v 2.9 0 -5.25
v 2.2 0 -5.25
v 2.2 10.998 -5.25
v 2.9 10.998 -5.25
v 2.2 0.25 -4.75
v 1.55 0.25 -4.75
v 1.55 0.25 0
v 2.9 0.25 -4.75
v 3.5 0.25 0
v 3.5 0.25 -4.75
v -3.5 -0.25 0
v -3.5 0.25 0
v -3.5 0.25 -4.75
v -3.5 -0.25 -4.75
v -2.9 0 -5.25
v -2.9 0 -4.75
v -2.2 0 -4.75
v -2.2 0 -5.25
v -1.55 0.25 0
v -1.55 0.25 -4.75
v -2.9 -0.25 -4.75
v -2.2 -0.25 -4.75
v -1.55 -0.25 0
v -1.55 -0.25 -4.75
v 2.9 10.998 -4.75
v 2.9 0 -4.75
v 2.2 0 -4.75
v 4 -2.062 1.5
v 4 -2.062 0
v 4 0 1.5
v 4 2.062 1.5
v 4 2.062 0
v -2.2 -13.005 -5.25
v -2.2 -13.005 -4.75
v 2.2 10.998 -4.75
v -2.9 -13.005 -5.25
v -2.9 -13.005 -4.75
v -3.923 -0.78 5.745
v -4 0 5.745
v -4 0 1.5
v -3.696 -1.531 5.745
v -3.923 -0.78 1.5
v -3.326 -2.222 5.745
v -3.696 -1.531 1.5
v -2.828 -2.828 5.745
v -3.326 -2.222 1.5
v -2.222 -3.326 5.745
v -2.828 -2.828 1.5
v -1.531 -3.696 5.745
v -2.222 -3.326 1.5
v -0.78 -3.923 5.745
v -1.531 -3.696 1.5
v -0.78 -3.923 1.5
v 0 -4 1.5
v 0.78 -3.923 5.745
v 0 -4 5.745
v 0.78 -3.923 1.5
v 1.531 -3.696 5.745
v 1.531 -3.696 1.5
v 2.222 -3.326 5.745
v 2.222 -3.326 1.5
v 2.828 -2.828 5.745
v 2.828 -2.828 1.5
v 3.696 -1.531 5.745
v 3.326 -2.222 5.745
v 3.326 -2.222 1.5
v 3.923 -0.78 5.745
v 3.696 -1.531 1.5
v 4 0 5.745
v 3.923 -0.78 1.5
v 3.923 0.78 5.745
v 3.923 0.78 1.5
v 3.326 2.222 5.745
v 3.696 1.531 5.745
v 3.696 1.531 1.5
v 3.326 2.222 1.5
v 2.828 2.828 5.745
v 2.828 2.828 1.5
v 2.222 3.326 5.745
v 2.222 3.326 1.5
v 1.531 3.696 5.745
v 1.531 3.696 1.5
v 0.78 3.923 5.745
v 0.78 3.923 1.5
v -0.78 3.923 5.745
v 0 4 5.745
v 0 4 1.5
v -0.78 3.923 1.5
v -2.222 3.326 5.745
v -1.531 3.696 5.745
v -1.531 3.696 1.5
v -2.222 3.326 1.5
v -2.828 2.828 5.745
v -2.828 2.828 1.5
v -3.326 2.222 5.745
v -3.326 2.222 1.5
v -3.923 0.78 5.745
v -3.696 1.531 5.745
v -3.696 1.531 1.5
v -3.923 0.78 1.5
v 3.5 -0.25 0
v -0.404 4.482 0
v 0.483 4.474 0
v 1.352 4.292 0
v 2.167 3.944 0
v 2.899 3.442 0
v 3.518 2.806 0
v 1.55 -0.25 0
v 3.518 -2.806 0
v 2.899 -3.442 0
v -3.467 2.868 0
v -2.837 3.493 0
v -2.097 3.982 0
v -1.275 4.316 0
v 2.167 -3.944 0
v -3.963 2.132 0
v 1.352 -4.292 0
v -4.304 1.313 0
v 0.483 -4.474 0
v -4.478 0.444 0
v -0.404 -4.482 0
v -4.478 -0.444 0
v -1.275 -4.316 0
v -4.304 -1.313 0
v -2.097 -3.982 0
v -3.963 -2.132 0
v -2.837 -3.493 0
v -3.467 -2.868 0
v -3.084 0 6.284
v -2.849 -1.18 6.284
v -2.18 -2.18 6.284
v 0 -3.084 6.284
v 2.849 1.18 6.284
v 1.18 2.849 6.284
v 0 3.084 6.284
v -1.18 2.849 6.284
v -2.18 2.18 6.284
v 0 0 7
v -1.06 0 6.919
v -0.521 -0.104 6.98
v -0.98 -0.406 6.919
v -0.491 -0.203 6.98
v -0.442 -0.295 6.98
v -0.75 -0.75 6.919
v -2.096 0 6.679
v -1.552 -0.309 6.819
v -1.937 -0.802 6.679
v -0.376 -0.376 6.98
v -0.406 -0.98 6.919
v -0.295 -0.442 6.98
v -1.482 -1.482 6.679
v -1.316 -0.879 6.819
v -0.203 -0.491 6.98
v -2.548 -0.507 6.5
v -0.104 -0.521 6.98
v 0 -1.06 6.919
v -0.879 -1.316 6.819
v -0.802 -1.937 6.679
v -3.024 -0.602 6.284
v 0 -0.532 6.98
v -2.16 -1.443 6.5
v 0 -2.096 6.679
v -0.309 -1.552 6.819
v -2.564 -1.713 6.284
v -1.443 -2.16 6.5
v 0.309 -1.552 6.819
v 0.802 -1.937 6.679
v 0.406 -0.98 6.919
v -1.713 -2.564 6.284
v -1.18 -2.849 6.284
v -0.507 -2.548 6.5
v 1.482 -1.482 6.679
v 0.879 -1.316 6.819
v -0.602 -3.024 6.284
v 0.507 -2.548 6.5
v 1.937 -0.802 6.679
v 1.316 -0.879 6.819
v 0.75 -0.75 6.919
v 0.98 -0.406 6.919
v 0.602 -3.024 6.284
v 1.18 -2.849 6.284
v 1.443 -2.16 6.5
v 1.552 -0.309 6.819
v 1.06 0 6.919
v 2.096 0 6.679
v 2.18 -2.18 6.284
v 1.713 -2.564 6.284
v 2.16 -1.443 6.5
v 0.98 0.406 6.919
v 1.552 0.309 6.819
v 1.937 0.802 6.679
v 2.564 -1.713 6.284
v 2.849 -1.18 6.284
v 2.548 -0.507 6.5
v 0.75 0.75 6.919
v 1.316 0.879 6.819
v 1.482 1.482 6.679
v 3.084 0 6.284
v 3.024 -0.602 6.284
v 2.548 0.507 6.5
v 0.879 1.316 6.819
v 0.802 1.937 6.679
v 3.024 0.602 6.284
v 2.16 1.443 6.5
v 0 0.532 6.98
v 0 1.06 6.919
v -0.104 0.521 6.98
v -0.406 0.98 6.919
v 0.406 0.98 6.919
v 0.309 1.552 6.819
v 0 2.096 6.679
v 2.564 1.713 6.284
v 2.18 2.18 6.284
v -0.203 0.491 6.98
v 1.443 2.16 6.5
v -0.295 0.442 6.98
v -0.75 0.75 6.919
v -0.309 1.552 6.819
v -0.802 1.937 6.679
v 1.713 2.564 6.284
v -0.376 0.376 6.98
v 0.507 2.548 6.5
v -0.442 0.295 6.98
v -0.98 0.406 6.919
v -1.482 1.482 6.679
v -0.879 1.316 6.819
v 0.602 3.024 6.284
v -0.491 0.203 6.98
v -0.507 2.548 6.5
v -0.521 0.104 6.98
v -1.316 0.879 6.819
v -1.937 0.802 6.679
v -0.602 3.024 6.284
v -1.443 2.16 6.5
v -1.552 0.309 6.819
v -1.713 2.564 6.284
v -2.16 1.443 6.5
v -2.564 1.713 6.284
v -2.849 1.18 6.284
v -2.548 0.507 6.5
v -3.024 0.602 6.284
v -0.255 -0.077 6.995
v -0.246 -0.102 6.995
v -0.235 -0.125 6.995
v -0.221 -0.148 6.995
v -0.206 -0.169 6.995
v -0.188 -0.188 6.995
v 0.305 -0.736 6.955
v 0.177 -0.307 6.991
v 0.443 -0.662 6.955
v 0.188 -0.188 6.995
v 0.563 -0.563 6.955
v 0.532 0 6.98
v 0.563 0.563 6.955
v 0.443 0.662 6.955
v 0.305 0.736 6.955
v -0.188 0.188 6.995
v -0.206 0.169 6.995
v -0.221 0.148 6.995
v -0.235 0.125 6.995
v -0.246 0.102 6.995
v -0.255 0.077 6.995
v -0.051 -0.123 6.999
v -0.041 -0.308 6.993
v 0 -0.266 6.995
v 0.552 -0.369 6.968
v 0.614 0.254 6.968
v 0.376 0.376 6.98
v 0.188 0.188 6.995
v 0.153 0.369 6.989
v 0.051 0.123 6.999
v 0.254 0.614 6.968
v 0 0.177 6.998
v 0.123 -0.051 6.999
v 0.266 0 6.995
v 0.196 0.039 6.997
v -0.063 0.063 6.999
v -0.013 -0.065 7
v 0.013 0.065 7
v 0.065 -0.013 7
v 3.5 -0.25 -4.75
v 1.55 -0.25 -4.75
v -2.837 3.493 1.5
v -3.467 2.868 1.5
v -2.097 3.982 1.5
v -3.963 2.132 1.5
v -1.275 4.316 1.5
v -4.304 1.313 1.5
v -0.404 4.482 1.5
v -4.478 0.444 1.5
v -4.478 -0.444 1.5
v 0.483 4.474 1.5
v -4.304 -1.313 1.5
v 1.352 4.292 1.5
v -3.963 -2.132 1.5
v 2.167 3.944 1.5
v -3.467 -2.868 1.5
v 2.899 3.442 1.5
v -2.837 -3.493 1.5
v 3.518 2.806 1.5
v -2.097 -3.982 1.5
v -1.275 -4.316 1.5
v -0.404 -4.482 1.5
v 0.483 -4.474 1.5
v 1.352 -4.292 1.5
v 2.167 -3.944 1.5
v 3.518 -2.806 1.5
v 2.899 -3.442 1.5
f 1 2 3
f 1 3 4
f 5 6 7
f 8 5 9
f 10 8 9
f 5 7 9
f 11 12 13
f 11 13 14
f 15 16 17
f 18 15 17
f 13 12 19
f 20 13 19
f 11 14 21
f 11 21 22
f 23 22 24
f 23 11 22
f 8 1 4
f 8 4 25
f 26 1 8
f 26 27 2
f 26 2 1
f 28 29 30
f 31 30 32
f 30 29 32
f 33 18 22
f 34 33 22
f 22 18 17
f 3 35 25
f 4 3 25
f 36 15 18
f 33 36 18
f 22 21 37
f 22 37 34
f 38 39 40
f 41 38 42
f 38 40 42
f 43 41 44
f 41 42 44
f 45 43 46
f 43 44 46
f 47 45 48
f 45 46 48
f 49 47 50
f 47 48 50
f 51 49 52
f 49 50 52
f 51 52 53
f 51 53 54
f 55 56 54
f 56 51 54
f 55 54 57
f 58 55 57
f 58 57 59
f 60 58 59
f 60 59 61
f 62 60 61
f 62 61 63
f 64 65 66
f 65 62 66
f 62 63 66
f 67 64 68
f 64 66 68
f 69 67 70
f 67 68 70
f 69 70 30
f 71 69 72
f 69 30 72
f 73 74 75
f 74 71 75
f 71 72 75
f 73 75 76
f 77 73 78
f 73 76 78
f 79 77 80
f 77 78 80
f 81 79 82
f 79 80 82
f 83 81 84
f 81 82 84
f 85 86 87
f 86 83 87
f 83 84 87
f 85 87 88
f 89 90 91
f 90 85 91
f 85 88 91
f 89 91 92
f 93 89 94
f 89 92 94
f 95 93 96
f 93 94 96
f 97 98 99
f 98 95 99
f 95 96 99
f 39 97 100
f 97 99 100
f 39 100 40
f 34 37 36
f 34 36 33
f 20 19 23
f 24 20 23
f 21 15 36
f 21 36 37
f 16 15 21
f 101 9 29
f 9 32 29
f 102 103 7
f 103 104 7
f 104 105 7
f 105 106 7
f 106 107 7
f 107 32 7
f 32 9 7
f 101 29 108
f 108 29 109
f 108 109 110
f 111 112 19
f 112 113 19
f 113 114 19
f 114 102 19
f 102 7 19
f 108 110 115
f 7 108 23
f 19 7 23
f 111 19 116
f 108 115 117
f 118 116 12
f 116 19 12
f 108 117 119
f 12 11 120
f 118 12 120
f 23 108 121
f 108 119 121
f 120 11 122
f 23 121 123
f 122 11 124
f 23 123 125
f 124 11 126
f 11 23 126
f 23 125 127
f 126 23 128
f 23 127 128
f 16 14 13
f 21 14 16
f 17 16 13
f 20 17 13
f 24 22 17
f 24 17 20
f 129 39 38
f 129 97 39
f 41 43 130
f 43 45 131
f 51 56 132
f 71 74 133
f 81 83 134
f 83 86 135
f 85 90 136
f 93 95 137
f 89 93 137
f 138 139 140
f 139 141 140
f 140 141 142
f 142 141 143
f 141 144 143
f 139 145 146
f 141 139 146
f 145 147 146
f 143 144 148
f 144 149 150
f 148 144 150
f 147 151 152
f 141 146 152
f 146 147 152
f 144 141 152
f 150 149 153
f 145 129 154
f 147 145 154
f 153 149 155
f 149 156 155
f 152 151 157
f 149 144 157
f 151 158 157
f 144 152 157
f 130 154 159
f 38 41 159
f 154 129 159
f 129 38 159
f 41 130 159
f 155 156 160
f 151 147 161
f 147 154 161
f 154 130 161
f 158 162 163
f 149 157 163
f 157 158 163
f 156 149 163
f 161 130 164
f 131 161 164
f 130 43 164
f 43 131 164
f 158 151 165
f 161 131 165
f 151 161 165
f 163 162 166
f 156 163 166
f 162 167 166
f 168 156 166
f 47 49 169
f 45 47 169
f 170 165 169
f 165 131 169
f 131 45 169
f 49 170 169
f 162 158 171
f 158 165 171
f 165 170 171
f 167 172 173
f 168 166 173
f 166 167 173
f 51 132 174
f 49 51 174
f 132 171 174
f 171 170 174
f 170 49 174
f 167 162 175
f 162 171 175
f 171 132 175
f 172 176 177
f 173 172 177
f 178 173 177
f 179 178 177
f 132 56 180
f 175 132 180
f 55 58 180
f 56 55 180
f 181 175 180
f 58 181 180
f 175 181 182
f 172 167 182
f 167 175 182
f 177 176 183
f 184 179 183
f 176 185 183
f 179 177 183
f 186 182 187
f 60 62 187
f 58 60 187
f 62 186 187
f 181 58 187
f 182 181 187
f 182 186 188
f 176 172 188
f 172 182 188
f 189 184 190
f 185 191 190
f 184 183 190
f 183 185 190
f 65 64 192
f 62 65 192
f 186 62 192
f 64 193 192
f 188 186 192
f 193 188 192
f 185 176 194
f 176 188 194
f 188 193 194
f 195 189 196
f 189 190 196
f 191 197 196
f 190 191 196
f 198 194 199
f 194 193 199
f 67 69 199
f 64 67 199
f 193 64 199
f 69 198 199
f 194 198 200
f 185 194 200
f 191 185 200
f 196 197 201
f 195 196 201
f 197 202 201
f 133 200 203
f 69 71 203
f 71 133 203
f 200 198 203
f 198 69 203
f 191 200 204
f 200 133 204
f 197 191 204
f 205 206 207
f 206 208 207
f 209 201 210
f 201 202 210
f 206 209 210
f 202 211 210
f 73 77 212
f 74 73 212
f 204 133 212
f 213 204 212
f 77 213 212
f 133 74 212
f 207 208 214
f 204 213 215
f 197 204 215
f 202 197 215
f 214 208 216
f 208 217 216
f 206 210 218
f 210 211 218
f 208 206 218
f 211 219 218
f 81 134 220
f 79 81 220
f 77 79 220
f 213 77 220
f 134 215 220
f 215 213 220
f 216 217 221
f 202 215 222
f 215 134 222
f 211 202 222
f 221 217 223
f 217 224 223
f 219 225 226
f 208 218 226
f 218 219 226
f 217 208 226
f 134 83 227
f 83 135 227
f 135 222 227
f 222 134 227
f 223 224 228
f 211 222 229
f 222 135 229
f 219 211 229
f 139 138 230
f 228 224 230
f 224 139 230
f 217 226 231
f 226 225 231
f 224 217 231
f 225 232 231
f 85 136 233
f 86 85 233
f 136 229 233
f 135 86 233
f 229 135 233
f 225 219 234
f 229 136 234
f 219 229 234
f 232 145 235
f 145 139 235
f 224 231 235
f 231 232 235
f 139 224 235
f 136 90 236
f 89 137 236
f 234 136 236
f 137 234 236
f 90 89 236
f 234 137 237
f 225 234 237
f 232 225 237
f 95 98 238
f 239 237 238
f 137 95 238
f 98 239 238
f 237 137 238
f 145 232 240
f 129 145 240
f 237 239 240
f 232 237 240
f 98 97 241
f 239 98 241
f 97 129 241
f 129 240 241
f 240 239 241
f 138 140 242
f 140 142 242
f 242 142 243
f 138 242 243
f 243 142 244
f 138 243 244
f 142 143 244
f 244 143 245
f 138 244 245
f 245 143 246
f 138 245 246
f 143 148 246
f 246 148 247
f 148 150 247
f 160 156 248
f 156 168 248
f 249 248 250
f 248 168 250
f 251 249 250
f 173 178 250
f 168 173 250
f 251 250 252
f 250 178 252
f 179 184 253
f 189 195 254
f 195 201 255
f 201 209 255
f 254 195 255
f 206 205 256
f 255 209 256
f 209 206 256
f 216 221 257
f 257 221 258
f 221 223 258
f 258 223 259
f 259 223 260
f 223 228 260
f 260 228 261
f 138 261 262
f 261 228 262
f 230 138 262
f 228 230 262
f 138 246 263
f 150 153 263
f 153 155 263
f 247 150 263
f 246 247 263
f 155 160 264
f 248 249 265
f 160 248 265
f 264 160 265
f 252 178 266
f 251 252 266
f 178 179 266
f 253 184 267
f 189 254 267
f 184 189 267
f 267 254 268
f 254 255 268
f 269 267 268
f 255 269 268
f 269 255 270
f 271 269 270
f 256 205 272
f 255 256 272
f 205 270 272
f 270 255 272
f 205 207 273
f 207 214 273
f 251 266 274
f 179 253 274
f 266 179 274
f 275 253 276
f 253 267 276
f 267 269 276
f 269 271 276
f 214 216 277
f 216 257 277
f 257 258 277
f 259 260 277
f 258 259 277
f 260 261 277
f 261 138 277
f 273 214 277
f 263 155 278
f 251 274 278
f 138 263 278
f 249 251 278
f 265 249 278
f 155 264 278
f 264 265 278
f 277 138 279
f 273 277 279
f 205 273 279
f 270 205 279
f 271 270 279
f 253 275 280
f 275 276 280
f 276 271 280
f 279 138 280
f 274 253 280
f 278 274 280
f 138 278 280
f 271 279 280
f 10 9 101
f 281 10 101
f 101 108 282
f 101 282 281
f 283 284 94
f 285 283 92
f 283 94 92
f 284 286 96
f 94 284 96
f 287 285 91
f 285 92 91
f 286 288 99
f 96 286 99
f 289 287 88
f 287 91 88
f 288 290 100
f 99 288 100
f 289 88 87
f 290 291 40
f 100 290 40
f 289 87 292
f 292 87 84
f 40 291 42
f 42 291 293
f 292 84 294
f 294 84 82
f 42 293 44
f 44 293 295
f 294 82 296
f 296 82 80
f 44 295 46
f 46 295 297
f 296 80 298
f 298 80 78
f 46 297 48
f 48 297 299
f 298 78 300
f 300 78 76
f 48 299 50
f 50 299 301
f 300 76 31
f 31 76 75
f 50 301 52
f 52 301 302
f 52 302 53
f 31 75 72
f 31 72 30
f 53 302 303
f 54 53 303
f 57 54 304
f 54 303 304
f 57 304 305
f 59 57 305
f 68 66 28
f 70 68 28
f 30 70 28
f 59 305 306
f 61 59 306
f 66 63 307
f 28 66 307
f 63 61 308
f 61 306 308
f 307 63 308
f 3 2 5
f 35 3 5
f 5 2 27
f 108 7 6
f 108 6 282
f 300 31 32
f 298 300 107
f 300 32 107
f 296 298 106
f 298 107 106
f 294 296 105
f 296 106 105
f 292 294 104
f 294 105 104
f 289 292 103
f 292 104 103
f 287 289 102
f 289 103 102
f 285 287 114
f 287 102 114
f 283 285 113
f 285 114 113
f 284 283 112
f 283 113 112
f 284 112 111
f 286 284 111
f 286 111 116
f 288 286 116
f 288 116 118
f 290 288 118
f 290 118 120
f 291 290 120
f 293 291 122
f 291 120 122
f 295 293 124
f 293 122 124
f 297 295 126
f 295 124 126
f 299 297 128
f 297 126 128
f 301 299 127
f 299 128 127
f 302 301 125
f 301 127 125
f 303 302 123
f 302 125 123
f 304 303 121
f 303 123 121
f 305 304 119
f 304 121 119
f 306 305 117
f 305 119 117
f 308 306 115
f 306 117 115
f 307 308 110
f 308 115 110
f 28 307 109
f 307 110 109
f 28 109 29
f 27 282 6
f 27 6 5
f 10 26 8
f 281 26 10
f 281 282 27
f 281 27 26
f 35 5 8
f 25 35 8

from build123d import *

# Parameters (mm, degrees)
F3_DEPTH  = 7.001
F4_W      = 1.95
F4_H      = 0.5
F5_DEPTH  = 4.75
F8_W      = 0.7
F8_H      = 0.5
F9_DEPTH  = 13.0048
F10_W     = 0.7
F10_H     = 0.5
F11_DEPTH = 10.9982


with BuildPart() as f1:
    # F0 (on Front) → F1 (revolve)
    with BuildSketch(Plane.XZ):
        with BuildLine():
            Line((-4.5, 0), (0, 0))
            Line((0, 0), (0, 7))
            ThreePointArc((0, 7), (-2.096194, 6.67877), (-4, 5.744563))
            Line((-4, 5.744563), (-4, 1.5))
            Line((-4, 1.5), (-4.5, 1.5))
            Line((-4.5, 1.5), (-4.5, 0))
        make_face()
    revolve(axis=Axis((0, 0, 3.5), (0, 0, 1)))

    # F2 (on face) → F3 (cut, through all)
    with BuildSketch(Plane(origin=(0, 0, 0), x_dir=(1, 0, 0), z_dir=(0, 0, -1))):
        with BuildLine():
            ThreePointArc((4, -2.061553), (4.5, 0), (4, 2.061553))
            Line((4, 2.061553), (4, -2.061553))
        make_face()
    extrude(amount=-F3_DEPTH, mode=Mode.SUBTRACT)

    # F4 (on face) → F5 (join)
    with BuildSketch(Plane(origin=(0, 0, 0), x_dir=(1, 0, 0), z_dir=(0, 0, -1))):
        with Locations((2.525, 0)):
            Rectangle(F4_W, F4_H)
        with Locations((-2.525, 0)):
            Rectangle(F4_W, F4_H)
    extrude(amount=F5_DEPTH)

    # F8 (on Front) → F9 (join)
    with BuildSketch(Plane.XZ):
        with Locations((-2.55, -5)):
            Rectangle(F8_W, F8_H)
    extrude(amount=F9_DEPTH)

    # F10 (on Front) → F11 (join)
    with BuildSketch(Plane.XZ):
        with Locations((2.55, -5)):
            Rectangle(F10_W, F10_H)
    extrude(amount=-F11_DEPTH)


solid = f1.part
